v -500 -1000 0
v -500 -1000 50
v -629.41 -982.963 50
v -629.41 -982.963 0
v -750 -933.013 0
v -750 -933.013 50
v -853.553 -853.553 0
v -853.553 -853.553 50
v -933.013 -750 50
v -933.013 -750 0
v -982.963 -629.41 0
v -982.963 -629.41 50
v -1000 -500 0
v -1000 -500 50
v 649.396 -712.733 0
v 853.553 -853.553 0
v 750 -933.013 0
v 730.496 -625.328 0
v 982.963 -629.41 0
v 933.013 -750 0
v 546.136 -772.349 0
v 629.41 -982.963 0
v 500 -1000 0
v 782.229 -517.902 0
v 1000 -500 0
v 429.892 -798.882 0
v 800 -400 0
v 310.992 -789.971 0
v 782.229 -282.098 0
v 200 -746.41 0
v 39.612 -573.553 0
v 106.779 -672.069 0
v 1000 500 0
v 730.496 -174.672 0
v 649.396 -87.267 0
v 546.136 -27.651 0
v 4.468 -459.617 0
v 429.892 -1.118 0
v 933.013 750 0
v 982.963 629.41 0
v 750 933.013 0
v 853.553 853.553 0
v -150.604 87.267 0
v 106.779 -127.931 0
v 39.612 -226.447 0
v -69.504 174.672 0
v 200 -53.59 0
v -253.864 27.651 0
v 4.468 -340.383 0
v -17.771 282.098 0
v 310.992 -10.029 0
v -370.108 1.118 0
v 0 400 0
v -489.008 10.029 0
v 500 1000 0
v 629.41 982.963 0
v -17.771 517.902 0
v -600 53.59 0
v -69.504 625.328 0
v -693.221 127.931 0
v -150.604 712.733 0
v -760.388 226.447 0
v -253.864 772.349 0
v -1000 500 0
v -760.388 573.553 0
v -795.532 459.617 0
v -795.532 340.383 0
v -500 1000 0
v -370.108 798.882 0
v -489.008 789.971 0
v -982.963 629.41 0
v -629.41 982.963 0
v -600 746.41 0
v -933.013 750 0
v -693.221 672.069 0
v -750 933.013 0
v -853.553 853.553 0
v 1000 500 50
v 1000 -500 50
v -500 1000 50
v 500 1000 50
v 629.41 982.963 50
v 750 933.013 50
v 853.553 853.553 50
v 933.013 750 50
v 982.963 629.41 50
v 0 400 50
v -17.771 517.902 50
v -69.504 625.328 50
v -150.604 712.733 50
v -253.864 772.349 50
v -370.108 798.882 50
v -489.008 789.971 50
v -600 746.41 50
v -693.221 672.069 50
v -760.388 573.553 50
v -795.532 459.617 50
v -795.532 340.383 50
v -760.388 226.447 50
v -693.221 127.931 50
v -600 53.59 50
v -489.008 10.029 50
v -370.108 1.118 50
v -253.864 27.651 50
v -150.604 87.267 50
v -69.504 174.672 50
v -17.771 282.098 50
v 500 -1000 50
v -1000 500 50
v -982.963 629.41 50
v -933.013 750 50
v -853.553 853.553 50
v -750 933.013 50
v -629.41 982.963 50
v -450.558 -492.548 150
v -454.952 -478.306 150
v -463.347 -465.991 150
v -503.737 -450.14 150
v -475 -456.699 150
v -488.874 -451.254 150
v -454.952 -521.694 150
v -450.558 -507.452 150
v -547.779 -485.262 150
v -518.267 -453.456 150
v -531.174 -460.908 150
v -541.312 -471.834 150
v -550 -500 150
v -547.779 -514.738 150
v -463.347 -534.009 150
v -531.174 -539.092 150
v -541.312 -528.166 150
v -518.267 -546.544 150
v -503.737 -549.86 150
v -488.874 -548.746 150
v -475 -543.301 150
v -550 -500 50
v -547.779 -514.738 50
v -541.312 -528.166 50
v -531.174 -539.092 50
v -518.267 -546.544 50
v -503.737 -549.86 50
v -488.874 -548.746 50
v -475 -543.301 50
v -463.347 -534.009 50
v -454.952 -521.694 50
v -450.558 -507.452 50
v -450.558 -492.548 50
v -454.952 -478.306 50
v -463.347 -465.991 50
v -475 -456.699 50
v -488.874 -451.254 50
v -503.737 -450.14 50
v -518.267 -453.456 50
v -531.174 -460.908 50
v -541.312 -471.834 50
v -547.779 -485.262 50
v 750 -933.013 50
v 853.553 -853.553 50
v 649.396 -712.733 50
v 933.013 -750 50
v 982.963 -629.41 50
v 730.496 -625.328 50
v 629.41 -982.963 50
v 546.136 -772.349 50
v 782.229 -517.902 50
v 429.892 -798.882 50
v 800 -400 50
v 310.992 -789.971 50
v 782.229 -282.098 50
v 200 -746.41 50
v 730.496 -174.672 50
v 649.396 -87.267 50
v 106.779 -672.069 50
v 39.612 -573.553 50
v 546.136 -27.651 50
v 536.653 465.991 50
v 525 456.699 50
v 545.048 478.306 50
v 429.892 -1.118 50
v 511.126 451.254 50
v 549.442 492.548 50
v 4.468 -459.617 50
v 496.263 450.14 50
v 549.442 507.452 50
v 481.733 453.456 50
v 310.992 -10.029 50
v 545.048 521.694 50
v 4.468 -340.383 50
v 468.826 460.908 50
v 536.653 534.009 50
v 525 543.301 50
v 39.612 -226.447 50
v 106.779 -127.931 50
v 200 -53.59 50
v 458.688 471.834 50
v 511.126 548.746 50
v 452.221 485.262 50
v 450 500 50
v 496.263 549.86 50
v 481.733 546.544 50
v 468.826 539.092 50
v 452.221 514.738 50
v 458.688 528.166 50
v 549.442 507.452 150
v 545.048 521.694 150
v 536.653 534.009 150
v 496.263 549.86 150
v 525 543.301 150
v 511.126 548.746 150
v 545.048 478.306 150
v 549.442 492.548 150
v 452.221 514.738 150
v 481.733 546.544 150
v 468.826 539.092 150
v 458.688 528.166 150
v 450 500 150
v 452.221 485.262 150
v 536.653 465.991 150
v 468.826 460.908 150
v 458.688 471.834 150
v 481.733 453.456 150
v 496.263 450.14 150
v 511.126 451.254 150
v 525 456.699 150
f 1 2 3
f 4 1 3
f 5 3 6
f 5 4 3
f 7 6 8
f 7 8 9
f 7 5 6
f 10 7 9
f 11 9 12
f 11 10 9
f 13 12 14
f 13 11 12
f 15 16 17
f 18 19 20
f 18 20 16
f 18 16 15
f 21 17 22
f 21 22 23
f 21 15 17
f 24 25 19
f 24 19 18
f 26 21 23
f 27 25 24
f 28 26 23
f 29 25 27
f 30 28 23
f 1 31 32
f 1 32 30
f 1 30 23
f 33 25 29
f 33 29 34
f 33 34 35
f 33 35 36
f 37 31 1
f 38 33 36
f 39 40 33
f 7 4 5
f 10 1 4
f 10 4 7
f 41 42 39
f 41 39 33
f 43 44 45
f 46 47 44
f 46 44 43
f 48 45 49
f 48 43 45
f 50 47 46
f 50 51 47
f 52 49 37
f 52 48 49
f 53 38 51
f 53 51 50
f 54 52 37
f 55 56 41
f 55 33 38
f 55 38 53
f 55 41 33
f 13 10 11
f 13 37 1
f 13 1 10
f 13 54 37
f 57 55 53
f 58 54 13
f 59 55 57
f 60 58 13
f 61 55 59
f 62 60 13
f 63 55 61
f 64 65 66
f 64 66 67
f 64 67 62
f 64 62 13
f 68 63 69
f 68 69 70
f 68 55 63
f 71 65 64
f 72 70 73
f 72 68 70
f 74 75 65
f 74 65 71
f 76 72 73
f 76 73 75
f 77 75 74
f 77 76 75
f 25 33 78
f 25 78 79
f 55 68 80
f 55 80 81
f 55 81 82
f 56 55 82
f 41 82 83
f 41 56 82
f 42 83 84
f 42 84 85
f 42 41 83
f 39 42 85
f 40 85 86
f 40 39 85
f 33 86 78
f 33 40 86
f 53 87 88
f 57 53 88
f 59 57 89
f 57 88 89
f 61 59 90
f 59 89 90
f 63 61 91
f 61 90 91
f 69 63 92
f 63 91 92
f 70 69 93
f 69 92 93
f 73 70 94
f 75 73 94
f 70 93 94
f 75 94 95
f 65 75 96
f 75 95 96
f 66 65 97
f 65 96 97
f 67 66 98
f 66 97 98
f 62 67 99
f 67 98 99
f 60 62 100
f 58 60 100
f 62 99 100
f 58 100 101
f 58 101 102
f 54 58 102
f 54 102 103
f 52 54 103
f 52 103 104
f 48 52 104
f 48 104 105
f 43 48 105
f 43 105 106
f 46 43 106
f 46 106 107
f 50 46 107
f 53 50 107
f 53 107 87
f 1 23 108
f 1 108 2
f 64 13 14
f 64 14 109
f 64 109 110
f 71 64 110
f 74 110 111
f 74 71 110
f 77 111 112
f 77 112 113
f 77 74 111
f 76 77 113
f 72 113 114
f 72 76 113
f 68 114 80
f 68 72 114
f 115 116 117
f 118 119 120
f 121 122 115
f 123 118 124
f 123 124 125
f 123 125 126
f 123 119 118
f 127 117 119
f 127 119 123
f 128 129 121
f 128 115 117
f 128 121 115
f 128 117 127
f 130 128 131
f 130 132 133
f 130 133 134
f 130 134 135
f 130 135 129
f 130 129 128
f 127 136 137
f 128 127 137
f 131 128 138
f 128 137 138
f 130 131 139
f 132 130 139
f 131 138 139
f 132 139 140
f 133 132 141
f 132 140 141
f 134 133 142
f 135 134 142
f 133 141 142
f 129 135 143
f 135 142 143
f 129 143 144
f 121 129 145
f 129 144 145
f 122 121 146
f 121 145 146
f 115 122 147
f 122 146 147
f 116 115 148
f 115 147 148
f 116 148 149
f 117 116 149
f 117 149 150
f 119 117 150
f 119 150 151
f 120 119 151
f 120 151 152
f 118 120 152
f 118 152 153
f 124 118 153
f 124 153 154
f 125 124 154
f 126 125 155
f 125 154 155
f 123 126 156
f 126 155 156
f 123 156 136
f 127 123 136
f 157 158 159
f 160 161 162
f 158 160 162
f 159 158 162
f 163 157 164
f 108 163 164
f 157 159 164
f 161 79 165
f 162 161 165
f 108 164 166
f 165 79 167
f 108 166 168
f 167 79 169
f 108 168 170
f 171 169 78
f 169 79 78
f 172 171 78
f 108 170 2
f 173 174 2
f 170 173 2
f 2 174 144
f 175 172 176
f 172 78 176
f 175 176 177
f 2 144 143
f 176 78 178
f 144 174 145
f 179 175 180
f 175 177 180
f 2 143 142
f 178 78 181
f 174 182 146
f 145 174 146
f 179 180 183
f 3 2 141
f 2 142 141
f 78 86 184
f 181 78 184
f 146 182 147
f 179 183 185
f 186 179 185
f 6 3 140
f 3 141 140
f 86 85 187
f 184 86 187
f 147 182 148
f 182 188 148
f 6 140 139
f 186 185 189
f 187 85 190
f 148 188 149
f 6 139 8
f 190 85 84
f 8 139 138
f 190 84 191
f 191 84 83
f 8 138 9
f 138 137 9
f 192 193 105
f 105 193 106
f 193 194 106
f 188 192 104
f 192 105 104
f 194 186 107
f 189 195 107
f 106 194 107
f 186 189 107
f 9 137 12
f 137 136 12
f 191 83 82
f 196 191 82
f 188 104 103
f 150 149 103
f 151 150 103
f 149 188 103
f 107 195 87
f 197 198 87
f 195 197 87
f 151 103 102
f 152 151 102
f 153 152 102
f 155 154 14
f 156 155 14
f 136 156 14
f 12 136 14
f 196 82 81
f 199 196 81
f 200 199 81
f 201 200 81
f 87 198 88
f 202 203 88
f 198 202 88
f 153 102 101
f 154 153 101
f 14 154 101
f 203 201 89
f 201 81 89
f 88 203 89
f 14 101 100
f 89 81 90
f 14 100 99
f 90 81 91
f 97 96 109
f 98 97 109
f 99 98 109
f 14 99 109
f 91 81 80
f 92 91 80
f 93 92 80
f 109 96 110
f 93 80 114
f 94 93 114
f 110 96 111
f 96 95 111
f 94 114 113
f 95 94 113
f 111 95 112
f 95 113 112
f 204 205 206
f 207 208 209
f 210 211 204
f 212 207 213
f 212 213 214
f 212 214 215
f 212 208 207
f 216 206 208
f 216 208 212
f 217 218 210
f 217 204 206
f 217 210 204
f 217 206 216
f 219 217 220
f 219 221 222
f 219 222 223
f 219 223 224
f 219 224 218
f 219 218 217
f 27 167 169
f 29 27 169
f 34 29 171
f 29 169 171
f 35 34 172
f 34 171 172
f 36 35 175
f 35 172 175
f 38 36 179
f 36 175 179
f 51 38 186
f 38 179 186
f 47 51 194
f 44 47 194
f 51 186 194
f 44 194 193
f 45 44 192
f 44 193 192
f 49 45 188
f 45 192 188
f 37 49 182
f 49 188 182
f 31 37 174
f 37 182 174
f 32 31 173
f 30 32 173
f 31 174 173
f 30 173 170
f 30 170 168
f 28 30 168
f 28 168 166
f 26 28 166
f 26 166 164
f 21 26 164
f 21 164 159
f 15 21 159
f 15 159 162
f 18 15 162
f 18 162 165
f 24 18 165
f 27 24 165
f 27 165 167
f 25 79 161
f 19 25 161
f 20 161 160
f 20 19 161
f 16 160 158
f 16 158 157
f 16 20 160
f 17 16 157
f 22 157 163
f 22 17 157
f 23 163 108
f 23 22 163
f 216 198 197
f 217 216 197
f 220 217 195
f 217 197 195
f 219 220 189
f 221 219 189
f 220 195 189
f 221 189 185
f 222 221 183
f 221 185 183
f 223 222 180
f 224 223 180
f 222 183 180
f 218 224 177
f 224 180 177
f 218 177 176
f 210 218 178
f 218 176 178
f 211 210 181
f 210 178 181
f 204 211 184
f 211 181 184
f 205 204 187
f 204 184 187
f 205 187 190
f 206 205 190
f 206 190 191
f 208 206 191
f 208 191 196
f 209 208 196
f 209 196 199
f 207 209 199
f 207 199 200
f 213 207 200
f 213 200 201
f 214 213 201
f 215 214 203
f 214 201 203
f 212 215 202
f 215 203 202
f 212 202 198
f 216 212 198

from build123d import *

# Parameters (mm, degrees)
BOSS_EXTRUDE1_DEPTH = 50
SKETCH2_R           = 50
BOSS_EXTRUDE2_DEPTH = 100
SKETCH3_R           = 400
CUT_EXTRUDE1_DEPTH  = 100


with BuildPart() as part:
    # Sketch1 → Boss-Extrude1 (new body)
    with BuildSketch(Plane.XY):
        with BuildLine():
            Line((-500, 1000), (500, 1000))
            ThreePointArc((500, 1000), (853.553390593, 853.553390593), (1000, 500))
            Line((1000, 500), (1000, -500))
            ThreePointArc((1000, -500), (853.553390593, -853.553390593), (500, -1000))
            Line((500, -1000), (-500, -1000))
            ThreePointArc((-500, -1000), (-853.553390593, -853.553390593), (-1000, -500))
            Line((-1000, -500), (-1000, 500))
            ThreePointArc((-1000, 500), (-853.553390593, 853.553390593), (-500, 1000))
        make_face()
    extrude(amount=BOSS_EXTRUDE1_DEPTH)

    # Sketch2 → Boss-Extrude2 (add)
    with BuildSketch(Plane.XY.offset(50)):
        with Locations(Location((-500, -500, 0), (0, 0, 180))):
            Circle(SKETCH2_R)
        with Locations(Location((500, 500, 0), (0, 0, 180))):
            Circle(SKETCH2_R)
    extrude(amount=BOSS_EXTRUDE2_DEPTH)

    # Sketch3 → Cut-Extrude1 (cut)
    with BuildSketch(Plane.XY.offset(50)):
        with Locations((400, -400)):
            Circle(SKETCH3_R)
        with Locations((-400, 400)):
            Circle(SKETCH3_R)
    extrude(amount=-CUT_EXTRUDE1_DEPTH, mode=Mode.SUBTRACT)


solid = part.part
